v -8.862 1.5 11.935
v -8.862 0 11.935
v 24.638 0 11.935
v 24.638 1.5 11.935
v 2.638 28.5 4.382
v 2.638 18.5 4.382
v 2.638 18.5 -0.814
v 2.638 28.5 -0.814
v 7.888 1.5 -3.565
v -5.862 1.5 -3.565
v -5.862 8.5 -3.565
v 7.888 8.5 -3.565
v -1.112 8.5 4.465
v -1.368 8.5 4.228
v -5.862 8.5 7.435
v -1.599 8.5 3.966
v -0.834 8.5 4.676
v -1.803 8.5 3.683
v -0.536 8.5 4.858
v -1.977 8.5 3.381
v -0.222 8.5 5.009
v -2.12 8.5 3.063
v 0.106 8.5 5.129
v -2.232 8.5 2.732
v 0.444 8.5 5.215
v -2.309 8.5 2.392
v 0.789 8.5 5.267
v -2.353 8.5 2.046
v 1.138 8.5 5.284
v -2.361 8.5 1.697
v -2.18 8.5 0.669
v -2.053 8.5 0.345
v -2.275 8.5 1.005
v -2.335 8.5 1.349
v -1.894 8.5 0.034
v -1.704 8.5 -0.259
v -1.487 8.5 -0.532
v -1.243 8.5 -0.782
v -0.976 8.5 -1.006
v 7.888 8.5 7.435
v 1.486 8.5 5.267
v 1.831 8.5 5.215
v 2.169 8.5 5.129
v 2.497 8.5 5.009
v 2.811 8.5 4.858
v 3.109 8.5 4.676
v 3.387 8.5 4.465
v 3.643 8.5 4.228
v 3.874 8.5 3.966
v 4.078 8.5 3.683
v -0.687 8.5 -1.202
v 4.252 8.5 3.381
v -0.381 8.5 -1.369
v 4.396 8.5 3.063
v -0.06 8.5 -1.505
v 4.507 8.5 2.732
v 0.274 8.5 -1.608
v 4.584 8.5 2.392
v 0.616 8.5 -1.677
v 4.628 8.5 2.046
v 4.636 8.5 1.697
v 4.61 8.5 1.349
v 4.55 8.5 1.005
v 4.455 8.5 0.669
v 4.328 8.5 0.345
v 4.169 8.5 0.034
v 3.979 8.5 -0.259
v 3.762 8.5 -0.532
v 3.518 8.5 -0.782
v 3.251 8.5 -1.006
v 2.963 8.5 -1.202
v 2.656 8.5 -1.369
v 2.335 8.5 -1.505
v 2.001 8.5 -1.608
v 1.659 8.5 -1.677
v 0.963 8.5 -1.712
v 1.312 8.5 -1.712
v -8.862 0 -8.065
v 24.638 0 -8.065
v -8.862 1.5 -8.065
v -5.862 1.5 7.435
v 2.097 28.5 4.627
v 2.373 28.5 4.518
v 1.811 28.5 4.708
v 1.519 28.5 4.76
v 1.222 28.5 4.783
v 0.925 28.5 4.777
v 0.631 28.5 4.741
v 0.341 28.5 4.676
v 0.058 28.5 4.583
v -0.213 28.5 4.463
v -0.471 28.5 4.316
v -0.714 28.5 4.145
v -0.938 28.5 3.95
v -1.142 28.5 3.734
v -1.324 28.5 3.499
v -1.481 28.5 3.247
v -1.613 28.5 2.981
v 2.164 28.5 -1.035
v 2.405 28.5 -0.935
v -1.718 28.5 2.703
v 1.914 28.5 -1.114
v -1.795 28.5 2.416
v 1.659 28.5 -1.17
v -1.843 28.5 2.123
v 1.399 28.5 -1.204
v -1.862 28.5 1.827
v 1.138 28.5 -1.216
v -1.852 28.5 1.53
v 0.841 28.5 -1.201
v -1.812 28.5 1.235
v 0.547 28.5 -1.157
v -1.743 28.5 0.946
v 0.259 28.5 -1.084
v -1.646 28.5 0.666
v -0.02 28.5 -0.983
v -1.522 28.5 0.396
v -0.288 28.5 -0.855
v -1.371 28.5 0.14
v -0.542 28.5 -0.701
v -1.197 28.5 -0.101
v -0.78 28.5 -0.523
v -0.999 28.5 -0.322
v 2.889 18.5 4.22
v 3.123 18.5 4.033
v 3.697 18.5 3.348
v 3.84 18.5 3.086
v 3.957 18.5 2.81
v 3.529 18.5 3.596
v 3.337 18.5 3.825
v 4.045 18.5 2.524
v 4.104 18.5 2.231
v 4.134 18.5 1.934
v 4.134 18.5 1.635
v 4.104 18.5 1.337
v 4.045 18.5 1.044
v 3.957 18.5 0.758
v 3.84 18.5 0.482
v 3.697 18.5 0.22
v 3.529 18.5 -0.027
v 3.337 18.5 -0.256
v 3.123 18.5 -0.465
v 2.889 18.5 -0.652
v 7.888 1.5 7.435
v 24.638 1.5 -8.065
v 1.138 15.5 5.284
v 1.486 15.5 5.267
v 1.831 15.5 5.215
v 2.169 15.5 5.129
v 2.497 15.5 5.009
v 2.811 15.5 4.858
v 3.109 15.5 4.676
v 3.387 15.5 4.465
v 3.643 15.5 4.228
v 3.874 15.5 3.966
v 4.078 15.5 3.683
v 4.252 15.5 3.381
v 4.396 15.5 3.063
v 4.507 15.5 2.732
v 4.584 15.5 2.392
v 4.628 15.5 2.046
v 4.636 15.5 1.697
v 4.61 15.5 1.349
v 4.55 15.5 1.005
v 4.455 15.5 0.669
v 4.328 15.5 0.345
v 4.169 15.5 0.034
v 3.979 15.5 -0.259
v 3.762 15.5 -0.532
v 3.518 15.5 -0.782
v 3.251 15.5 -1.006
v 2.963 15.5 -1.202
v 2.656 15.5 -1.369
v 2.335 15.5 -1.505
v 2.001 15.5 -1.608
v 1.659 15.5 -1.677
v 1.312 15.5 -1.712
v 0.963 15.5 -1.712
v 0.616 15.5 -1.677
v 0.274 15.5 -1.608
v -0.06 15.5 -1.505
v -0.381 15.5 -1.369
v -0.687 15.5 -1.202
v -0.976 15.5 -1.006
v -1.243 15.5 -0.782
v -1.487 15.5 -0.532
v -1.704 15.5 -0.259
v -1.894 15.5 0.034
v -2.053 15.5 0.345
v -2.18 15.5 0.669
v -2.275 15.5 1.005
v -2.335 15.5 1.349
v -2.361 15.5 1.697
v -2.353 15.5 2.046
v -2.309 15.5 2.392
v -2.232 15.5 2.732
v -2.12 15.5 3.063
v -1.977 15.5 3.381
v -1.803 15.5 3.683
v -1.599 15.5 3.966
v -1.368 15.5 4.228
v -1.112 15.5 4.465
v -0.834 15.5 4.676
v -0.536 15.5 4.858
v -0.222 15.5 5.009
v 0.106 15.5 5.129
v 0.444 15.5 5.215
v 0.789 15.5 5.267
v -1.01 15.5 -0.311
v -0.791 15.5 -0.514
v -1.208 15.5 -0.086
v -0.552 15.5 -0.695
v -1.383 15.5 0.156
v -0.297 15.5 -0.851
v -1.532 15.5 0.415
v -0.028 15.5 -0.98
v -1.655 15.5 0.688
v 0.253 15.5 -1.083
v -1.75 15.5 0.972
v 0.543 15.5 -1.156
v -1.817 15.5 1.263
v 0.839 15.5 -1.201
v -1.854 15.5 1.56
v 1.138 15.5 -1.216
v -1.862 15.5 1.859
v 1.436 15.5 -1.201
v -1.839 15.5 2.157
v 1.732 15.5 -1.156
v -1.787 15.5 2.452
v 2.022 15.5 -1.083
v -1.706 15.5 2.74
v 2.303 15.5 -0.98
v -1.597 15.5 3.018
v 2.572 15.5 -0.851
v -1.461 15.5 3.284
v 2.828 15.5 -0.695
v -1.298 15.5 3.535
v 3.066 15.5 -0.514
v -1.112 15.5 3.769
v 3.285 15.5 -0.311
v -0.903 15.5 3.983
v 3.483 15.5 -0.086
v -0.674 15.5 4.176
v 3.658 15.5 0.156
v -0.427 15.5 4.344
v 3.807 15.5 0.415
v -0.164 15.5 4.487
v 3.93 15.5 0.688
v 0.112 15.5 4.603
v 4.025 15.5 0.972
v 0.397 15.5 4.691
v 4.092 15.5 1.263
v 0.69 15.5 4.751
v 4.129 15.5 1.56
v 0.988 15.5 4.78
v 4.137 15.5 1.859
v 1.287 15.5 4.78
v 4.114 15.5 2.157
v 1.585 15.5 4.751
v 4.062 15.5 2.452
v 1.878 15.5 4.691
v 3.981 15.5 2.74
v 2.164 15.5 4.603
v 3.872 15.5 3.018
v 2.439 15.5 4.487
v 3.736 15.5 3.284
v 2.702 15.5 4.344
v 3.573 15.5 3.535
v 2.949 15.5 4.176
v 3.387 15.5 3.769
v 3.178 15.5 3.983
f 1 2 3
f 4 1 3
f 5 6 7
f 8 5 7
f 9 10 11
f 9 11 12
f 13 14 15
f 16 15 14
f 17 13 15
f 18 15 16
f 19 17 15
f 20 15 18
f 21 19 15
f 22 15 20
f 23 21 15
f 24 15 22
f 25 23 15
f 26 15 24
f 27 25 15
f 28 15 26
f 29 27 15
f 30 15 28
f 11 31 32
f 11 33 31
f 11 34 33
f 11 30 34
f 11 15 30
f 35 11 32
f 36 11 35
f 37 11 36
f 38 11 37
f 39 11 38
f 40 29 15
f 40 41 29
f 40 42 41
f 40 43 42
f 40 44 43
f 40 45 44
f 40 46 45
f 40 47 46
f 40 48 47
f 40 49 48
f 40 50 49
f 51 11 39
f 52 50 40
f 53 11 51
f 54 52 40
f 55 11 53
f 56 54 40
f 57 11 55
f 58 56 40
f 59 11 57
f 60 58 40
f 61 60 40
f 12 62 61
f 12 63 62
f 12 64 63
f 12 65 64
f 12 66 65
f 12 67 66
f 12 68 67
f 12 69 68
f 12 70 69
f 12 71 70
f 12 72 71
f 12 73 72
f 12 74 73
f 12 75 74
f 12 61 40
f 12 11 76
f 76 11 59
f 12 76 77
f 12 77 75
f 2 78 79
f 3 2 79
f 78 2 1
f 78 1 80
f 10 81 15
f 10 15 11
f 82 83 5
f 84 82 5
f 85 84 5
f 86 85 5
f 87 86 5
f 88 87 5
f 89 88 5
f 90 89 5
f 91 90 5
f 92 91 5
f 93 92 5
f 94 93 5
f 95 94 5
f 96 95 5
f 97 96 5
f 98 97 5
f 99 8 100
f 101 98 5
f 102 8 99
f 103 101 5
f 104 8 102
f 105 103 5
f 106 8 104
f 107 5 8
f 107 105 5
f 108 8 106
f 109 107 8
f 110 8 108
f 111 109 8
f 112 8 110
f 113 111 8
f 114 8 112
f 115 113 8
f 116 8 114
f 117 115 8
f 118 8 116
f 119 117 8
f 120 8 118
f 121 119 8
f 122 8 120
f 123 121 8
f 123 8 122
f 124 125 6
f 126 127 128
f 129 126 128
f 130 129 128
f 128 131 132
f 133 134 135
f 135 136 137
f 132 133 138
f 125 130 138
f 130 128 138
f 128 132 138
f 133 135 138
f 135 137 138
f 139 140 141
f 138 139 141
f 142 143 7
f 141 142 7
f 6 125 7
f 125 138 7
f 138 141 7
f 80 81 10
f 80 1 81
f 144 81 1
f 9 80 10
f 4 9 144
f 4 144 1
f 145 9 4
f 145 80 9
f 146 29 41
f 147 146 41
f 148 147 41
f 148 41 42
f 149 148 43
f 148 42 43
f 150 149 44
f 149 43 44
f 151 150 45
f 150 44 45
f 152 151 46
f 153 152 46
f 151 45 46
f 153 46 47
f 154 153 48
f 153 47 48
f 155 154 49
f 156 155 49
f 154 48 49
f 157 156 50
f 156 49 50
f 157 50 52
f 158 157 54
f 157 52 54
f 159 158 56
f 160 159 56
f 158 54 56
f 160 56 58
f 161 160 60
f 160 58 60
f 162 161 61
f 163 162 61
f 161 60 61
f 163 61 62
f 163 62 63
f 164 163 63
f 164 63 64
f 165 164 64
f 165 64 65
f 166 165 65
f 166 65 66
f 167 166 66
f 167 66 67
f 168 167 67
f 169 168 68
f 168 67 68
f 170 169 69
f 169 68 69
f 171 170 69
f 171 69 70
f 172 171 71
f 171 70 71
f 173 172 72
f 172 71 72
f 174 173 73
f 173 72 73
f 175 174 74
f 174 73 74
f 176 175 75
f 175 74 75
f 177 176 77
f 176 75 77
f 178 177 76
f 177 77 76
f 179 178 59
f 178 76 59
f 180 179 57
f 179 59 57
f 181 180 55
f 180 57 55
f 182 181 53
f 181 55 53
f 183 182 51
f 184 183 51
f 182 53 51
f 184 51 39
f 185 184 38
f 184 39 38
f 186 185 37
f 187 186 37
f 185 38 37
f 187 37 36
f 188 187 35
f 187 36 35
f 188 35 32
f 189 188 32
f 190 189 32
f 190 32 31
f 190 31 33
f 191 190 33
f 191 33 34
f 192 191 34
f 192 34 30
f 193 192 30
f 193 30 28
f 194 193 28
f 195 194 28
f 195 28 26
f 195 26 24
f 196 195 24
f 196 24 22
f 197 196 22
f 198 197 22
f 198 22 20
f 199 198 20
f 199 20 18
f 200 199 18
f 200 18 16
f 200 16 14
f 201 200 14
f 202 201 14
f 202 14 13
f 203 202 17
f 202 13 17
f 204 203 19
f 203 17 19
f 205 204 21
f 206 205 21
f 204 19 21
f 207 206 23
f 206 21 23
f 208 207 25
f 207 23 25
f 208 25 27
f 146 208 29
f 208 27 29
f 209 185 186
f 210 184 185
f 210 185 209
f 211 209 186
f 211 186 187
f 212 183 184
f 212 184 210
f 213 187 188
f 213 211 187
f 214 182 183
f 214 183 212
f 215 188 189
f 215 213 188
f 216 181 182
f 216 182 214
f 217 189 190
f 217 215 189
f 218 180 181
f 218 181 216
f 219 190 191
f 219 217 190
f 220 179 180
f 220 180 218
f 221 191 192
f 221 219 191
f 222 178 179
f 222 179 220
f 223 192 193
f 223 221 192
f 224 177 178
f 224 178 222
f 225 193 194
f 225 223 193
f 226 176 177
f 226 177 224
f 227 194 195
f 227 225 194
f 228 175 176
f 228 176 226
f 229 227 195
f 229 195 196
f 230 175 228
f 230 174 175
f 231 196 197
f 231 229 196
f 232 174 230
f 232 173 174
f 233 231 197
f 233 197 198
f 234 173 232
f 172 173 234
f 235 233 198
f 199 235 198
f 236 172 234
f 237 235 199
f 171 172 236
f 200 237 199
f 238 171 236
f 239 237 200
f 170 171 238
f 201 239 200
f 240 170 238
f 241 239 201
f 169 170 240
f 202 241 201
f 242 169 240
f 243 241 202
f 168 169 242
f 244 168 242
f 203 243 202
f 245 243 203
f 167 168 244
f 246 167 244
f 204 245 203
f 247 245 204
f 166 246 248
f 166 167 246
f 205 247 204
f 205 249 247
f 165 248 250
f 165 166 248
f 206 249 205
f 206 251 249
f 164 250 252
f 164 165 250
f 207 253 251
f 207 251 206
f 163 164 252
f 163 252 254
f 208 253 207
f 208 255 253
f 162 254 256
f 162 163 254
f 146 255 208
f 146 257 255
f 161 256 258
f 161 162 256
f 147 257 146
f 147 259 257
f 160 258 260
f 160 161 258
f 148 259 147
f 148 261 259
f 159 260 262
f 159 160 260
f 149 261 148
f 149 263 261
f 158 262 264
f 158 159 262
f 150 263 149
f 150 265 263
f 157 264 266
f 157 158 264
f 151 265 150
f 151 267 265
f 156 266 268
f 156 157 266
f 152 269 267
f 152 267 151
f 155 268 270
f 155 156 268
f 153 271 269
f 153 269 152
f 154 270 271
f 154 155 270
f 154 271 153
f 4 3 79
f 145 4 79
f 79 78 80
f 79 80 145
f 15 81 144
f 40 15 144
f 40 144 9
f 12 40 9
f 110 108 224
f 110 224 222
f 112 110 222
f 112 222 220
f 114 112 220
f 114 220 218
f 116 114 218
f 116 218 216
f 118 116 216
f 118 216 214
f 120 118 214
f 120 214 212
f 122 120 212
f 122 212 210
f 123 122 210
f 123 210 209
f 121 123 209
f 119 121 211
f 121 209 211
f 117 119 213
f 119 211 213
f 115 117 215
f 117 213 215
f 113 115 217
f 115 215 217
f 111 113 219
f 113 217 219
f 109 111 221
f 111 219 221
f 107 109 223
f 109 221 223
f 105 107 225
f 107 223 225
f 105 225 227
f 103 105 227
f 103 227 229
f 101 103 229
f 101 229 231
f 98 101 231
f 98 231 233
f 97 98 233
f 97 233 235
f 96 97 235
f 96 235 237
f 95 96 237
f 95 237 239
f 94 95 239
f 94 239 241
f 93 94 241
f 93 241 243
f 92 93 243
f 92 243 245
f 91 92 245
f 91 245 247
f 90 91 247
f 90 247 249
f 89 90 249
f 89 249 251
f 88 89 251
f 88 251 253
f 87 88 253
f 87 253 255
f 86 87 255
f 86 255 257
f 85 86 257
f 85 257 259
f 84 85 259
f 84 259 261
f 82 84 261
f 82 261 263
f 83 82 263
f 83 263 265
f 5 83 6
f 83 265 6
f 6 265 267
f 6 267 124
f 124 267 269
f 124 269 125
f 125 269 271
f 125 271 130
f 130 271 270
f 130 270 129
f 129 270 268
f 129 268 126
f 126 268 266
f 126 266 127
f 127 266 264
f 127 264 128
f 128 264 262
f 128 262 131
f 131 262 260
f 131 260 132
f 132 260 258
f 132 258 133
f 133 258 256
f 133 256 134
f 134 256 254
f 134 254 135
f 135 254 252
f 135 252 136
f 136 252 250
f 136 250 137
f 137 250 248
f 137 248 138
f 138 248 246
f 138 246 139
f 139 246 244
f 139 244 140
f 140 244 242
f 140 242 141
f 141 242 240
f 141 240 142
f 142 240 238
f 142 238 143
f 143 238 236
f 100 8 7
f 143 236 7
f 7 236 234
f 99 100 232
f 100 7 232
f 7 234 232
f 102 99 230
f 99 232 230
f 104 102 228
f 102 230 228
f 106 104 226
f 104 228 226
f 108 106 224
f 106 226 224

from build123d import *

# Parameters (mm, degrees)
SKETCH1_W           = 33.5
SKETCH1_H           = 20
BOSS_EXTRUDE1_DEPTH = 1.5
SKETCH2_W           = 13.75
SKETCH2_H           = 11
BOSS_EXTRUDE2_DEPTH = 7
SKETCH3_R           = 3.5
BOSS_EXTRUDE3_DEPTH = 7
SKETCH4_R           = 3
BOSS_EXTRUDE4_DEPTH = 13
CUT_EXTRUDE1_START  = -10
CUT_EXTRUDE1_DEPTH  = 10


with BuildPart() as part:
    # Sketch1 → Boss-Extrude1 (new body)
    with BuildSketch(Plane(origin=(0, 0, 0), x_dir=(1, 0, 0), z_dir=(0, 1, 0))):
        with Locations((7.887566138, -1.935185185)):
            Rectangle(SKETCH1_W, SKETCH1_H)
    extrude(amount=BOSS_EXTRUDE1_DEPTH)

    # Sketch2 → Boss-Extrude2 (add)
    with BuildSketch(Plane(origin=(0, 1.5, 0), x_dir=(1, 0, 0), z_dir=(0, 1, 0))):
        with Locations((1.012566138, -1.935185185)):
            Rectangle(SKETCH2_W, SKETCH2_H)
    extrude(amount=BOSS_EXTRUDE2_DEPTH)

    # Sketch3 → Boss-Extrude3 (add)
    with BuildSketch(Plane(origin=(0, 8.5, 0), x_dir=(1, 0, 0), z_dir=(0, 1, 0))):
        with Locations(Location((1.137566138, -1.784110138, 0), (0, 0, 270))):
            Circle(SKETCH3_R)
    extrude(amount=BOSS_EXTRUDE3_DEPTH)

    # Sketch4 → Boss-Extrude4 (add)
    with BuildSketch(Plane(origin=(0, 15.5, 0), x_dir=(1, 0, 0), z_dir=(0, 1, 0))):
        with Locations(Location((1.137566138, -1.784110138, 0), (0, 0, 90))):
            Circle(SKETCH4_R)
    extrude(amount=BOSS_EXTRUDE4_DEPTH)

    # Sketch5 → Cut-Extrude1 (cut)
    with BuildSketch(Plane(origin=(0, 28.5, 0), x_dir=(1, 0, 0), z_dir=(0, 1, 0)).offset(CUT_EXTRUDE1_START)):
        with BuildLine():
            Line((2.637566138, -1.784110138), (2.637566138, 0.813966073))
            ThreePointArc((2.637566138, 0.813966073), (4.137566138, -1.784110138), (2.637566138, -4.382186349))
            Line((2.637566138, -4.382186349), (2.637566138, -1.784110138))
        make_face()
    extrude(amount=CUT_EXTRUDE1_DEPTH, mode=Mode.SUBTRACT)


solid = part.part
